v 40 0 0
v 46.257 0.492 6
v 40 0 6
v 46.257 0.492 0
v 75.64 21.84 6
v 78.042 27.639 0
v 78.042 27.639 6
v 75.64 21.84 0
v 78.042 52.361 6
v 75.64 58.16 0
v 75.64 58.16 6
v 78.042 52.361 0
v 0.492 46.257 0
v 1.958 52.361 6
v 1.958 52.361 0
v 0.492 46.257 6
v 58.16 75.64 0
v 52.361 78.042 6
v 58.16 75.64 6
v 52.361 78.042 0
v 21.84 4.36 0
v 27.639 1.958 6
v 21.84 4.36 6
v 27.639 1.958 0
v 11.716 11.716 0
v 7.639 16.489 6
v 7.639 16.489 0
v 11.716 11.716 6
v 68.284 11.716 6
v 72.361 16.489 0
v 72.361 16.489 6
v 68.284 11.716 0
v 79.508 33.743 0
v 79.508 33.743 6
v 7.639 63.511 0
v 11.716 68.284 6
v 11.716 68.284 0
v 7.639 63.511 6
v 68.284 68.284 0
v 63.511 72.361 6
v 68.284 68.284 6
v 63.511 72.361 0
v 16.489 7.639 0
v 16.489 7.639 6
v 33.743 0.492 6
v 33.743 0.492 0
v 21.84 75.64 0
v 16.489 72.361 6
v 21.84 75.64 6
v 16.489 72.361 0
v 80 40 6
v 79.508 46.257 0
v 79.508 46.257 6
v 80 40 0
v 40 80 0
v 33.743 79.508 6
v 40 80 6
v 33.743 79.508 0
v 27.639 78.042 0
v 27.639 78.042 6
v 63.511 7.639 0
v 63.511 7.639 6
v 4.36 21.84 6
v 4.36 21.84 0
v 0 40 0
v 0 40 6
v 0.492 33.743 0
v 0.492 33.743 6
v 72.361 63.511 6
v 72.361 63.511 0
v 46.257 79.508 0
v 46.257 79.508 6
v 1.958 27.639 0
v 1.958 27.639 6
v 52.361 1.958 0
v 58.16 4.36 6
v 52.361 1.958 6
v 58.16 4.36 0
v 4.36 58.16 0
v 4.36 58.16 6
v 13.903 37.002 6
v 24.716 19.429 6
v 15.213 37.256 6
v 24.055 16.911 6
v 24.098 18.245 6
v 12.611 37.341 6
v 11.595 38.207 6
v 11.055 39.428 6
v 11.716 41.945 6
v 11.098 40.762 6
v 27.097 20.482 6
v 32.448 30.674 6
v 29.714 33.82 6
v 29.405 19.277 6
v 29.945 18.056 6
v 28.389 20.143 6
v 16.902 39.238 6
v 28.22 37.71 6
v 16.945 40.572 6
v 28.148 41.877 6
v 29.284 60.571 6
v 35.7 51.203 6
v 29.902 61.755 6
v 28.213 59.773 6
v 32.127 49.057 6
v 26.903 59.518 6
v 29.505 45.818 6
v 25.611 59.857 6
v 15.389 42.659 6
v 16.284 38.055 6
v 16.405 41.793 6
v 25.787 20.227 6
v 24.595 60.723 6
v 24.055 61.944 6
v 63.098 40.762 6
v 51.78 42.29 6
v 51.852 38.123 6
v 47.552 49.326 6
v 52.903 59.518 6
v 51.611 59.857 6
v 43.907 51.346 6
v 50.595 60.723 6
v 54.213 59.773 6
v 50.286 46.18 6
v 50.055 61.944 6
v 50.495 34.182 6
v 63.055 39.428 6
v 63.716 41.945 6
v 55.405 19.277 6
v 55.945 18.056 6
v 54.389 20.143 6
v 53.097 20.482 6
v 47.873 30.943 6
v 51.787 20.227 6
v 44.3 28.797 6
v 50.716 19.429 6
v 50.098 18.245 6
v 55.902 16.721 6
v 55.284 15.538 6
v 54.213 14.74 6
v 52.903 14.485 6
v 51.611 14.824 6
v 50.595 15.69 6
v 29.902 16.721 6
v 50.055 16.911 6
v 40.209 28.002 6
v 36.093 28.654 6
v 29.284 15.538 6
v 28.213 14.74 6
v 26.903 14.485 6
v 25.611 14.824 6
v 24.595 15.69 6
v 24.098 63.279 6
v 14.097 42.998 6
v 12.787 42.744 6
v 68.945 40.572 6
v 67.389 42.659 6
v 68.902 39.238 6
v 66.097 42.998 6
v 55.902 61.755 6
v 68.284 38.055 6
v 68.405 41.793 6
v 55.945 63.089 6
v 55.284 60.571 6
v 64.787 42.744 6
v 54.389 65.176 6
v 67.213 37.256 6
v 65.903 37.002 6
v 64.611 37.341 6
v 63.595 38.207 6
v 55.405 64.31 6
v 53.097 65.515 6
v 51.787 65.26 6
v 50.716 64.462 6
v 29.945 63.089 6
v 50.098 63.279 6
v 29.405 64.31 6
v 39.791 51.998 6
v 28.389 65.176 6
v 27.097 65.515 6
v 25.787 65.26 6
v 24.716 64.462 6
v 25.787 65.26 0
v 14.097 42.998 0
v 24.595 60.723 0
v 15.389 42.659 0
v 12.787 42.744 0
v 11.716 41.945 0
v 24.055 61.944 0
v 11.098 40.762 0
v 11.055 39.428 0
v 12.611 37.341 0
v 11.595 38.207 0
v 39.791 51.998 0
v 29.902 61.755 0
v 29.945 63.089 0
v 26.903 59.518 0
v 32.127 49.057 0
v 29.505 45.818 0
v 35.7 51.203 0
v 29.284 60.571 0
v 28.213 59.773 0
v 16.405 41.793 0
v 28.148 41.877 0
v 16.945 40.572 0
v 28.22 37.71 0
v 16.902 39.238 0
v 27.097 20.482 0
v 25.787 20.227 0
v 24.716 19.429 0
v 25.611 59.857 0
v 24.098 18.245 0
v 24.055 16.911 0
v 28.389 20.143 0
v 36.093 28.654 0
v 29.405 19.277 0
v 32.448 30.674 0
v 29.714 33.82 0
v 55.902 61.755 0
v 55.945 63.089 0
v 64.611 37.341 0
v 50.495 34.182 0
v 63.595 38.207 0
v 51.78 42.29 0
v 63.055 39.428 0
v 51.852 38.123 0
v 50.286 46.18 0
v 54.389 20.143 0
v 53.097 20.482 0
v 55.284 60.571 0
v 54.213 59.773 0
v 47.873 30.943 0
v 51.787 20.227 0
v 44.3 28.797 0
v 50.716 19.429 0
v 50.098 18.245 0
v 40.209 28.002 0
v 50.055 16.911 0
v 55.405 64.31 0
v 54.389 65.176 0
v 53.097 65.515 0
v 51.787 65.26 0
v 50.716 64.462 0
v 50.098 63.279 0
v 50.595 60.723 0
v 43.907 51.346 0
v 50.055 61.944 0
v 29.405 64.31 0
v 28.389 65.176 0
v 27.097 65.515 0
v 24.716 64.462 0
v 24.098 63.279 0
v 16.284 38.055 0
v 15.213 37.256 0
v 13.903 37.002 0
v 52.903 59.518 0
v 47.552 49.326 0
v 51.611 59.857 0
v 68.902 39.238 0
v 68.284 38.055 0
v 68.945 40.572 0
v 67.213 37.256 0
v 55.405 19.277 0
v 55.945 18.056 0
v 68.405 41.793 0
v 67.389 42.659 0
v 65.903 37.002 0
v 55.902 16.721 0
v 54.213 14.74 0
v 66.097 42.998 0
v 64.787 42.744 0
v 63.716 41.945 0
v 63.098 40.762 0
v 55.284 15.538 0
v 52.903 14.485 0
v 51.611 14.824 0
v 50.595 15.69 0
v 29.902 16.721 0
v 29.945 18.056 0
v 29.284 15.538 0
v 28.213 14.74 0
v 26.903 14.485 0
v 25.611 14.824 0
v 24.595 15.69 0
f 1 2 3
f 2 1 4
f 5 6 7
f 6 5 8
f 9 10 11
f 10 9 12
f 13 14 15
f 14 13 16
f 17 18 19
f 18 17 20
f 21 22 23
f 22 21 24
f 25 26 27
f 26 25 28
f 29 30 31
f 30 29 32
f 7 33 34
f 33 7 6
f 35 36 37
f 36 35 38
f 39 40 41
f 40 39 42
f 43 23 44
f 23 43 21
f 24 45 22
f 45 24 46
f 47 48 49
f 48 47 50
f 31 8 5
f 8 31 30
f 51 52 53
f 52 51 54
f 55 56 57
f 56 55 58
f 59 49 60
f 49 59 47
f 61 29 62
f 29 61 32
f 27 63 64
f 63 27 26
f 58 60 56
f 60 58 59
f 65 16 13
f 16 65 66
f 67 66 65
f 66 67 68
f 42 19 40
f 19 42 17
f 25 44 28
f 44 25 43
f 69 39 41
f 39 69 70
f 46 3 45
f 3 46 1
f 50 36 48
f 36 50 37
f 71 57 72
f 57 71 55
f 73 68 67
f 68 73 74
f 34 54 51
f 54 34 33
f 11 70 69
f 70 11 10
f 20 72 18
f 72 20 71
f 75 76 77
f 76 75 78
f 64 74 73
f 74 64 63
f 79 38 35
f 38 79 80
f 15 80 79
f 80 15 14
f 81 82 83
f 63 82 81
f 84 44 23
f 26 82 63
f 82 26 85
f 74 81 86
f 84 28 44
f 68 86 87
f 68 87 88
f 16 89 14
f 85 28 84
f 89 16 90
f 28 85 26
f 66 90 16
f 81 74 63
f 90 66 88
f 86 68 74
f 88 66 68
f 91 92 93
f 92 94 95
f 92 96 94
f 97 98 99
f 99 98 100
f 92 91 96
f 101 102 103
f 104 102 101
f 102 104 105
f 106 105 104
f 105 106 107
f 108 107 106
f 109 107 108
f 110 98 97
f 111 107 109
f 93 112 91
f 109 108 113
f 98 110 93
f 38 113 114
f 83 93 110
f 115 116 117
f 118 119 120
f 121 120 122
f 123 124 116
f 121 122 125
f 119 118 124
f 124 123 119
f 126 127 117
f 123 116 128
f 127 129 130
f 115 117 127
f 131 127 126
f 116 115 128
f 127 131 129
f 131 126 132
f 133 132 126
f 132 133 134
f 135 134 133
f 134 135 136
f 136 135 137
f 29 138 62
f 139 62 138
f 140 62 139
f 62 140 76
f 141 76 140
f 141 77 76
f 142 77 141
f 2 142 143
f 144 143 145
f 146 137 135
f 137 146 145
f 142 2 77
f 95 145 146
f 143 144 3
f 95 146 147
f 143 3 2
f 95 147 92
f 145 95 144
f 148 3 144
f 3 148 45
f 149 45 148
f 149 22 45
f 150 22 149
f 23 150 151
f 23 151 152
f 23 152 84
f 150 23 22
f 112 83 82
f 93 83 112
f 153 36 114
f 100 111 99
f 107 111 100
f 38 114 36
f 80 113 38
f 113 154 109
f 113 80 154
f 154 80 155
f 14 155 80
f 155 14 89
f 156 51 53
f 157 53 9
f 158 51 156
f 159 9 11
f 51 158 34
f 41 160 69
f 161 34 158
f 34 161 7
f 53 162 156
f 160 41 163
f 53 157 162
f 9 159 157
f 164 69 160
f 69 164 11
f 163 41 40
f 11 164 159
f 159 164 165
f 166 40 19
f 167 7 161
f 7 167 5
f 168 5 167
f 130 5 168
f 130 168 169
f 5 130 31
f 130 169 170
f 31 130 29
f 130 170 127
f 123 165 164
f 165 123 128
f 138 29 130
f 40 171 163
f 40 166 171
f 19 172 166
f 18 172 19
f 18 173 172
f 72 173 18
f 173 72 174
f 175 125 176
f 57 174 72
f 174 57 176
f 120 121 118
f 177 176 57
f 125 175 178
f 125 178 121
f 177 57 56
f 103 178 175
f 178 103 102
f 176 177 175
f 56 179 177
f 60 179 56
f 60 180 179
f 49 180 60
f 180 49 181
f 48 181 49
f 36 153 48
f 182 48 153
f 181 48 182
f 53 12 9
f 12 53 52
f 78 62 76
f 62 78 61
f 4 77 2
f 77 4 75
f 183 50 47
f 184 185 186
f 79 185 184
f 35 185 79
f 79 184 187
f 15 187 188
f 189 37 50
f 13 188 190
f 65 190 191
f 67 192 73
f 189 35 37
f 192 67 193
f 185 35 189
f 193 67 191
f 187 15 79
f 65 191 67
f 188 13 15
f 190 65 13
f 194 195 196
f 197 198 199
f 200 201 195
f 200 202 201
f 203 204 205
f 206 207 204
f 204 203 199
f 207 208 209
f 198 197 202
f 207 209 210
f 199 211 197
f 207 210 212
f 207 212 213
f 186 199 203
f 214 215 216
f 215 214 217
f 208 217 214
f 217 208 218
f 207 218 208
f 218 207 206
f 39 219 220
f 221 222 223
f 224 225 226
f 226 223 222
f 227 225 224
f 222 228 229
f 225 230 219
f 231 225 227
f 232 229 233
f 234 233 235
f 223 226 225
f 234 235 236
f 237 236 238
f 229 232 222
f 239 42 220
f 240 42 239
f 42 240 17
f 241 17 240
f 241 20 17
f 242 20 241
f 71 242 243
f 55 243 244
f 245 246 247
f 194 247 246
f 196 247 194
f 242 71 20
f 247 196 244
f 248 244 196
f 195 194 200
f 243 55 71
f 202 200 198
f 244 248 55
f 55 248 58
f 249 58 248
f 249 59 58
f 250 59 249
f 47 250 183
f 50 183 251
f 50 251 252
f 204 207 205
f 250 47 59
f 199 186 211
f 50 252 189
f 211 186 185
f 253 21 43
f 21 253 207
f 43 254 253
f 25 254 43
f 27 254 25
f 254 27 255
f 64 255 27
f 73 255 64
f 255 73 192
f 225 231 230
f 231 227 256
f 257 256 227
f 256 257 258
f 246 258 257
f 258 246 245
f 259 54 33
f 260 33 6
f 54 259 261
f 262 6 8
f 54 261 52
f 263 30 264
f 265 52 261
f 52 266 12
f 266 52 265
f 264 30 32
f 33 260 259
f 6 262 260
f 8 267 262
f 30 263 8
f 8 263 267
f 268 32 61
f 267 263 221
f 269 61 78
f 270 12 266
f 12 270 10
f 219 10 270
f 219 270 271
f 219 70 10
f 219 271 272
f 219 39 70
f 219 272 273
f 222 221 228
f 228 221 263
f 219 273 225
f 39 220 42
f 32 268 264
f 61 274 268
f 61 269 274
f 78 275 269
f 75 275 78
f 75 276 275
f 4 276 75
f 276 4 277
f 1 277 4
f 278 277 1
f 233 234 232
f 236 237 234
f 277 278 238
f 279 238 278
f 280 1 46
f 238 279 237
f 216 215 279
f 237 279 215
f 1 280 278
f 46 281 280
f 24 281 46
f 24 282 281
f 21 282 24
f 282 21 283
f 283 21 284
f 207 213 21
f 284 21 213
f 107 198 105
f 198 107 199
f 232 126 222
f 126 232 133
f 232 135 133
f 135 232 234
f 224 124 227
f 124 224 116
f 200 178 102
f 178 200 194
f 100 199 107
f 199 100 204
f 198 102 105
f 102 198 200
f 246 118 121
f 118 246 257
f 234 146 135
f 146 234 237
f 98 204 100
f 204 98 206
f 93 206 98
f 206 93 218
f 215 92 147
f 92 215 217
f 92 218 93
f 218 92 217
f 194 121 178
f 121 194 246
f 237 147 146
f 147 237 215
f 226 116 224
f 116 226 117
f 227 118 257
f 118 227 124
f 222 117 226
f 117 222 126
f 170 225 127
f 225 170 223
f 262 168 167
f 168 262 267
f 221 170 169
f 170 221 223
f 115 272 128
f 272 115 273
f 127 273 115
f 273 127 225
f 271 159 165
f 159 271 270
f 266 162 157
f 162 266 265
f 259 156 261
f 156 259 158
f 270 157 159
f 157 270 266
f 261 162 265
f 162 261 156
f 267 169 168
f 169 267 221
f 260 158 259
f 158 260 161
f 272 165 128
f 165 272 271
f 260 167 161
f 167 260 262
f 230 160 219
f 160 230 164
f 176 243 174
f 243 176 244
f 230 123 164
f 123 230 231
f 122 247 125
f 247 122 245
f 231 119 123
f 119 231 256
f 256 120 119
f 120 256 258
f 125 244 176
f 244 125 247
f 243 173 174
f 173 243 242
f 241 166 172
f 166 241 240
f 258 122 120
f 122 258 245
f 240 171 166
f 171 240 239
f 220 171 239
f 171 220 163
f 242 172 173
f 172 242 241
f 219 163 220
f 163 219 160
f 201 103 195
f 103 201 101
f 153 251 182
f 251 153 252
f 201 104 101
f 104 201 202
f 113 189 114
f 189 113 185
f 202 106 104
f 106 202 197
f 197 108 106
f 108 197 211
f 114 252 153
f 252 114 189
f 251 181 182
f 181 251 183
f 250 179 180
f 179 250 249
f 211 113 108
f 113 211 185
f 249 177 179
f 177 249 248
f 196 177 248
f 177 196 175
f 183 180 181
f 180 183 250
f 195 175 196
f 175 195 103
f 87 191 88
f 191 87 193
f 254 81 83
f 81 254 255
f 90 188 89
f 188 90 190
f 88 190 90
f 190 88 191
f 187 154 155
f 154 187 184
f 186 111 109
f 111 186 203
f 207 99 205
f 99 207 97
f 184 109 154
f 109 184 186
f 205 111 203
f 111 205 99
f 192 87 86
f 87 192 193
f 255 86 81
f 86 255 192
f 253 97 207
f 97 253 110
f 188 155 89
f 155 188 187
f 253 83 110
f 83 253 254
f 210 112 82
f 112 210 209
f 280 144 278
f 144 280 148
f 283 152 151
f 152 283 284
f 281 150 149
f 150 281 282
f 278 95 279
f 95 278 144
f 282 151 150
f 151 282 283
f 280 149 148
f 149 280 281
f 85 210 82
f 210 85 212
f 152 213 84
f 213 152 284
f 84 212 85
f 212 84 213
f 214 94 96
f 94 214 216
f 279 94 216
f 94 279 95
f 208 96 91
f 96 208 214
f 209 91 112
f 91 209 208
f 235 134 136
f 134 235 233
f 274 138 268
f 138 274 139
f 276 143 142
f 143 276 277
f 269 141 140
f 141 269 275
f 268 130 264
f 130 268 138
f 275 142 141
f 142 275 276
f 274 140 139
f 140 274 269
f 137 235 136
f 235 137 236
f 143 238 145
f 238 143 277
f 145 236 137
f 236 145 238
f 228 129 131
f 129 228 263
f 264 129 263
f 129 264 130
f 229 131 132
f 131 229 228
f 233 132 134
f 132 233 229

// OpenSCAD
$fn = 32;

// ----------------------------------------------------------------------
// Spacer plate: round flange R40, 6 bolts
// ----------------------------------------------------------------------

// --- parameters (mm) ---
bore_r = 12;              // centre bore radius
bolt_r = 3;               // bolt hole radius
plate_t = 6;              // plate thickness, Z (extrusion height)
flange_r = 40;            // flange radius
n_bolt = 6;               // bolt hole count
ring_r = 26;              // bolt circle radius

profile = [[80, 40], [79.508, 46.257], [78.042, 52.361], [75.64, 58.16], [72.361, 63.511], [68.284, 68.284], [63.511, 72.361], [58.16, 75.64], [52.361, 78.042], [46.257, 79.508], [40, 80], [33.743, 79.508], [27.639, 78.042], [21.84, 75.64], [16.489, 72.361], [11.716, 68.284], [7.639, 63.511], [4.36, 58.16], [1.958, 52.361], [0.492, 46.257], [0, 40], [0.492, 33.743], [1.958, 27.639], [4.36, 21.84], [7.639, 16.489], [11.716, 11.716], [16.489, 7.639], [21.84, 4.36], [27.639, 1.958], [33.743, 0.492], [40, 0], [46.257, 0.492], [52.361, 1.958], [58.16, 4.36], [63.511, 7.639], [68.284, 11.716], [72.361, 16.489], [75.64, 21.84], [78.042, 27.639], [79.508, 33.743]];  // primary outline, 40 points, counter clockwise
void_1 = [[51.78, 42.29], [50.286, 46.18], [47.552, 49.326], [43.907, 51.346], [39.791, 51.998], [35.7, 51.203], [32.127, 49.057], [29.505, 45.818], [28.148, 41.877], [28.22, 37.71], [29.714, 33.82], [32.448, 30.674], [36.093, 28.654], [40.209, 28.002], [44.3, 28.797], [47.873, 30.943], [50.495, 34.182], [51.852, 38.123]];  // centre bore, 18 points
void_2 = [[68.945, 40.572], [68.405, 41.793], [67.389, 42.659], [66.097, 42.998], [64.787, 42.744], [63.716, 41.945], [63.098, 40.762], [63.055, 39.428], [63.595, 38.207], [64.611, 37.341], [65.903, 37.002], [67.213, 37.256], [68.284, 38.055], [68.902, 39.238]];  // bolt hole 1, 14 points
void_3 = [[55.945, 63.089], [55.405, 64.31], [54.389, 65.176], [53.097, 65.515], [51.787, 65.26], [50.716, 64.462], [50.098, 63.279], [50.055, 61.944], [50.595, 60.723], [51.611, 59.857], [52.903, 59.518], [54.213, 59.773], [55.284, 60.571], [55.902, 61.755]];  // bolt hole 2, 14 points
void_4 = [[29.945, 63.089], [29.405, 64.31], [28.389, 65.176], [27.097, 65.515], [25.787, 65.26], [24.716, 64.462], [24.098, 63.279], [24.055, 61.944], [24.595, 60.723], [25.611, 59.857], [26.903, 59.518], [28.213, 59.773], [29.284, 60.571], [29.902, 61.755]];  // bolt hole 3, 14 points
void_5 = [[16.945, 40.572], [16.405, 41.793], [15.389, 42.659], [14.097, 42.998], [12.787, 42.744], [11.716, 41.945], [11.098, 40.762], [11.055, 39.428], [11.595, 38.207], [12.611, 37.341], [13.903, 37.002], [15.213, 37.256], [16.284, 38.055], [16.902, 39.238]];  // bolt hole 4, 14 points
void_6 = [[29.945, 18.056], [29.405, 19.277], [28.389, 20.143], [27.097, 20.482], [25.787, 20.227], [24.716, 19.429], [24.098, 18.245], [24.055, 16.911], [24.595, 15.69], [25.611, 14.824], [26.903, 14.485], [28.213, 14.74], [29.284, 15.538], [29.902, 16.721]];  // bolt hole 5, 14 points
void_7 = [[55.945, 18.056], [55.405, 19.277], [54.389, 20.143], [53.097, 20.482], [51.787, 20.227], [50.716, 19.429], [50.098, 18.245], [50.055, 16.911], [50.595, 15.69], [51.611, 14.824], [52.903, 14.485], [54.213, 14.74], [55.284, 15.538], [55.902, 16.721]];  // bolt hole 6, 14 points

// --- the one profile operation ---
difference() {
  linear_extrude(height = plate_t) polygon(points = profile);
  translate([0, 0, -1])
    linear_extrude(height = plate_t + 2) polygon(points = void_1);
  translate([0, 0, -1])
    linear_extrude(height = plate_t + 2) polygon(points = void_2);
  translate([0, 0, -1])
    linear_extrude(height = plate_t + 2) polygon(points = void_3);
  translate([0, 0, -1])
    linear_extrude(height = plate_t + 2) polygon(points = void_4);
  translate([0, 0, -1])
    linear_extrude(height = plate_t + 2) polygon(points = void_5);
  translate([0, 0, -1])
    linear_extrude(height = plate_t + 2) polygon(points = void_6);
  translate([0, 0, -1])
    linear_extrude(height = plate_t + 2) polygon(points = void_7);
}
